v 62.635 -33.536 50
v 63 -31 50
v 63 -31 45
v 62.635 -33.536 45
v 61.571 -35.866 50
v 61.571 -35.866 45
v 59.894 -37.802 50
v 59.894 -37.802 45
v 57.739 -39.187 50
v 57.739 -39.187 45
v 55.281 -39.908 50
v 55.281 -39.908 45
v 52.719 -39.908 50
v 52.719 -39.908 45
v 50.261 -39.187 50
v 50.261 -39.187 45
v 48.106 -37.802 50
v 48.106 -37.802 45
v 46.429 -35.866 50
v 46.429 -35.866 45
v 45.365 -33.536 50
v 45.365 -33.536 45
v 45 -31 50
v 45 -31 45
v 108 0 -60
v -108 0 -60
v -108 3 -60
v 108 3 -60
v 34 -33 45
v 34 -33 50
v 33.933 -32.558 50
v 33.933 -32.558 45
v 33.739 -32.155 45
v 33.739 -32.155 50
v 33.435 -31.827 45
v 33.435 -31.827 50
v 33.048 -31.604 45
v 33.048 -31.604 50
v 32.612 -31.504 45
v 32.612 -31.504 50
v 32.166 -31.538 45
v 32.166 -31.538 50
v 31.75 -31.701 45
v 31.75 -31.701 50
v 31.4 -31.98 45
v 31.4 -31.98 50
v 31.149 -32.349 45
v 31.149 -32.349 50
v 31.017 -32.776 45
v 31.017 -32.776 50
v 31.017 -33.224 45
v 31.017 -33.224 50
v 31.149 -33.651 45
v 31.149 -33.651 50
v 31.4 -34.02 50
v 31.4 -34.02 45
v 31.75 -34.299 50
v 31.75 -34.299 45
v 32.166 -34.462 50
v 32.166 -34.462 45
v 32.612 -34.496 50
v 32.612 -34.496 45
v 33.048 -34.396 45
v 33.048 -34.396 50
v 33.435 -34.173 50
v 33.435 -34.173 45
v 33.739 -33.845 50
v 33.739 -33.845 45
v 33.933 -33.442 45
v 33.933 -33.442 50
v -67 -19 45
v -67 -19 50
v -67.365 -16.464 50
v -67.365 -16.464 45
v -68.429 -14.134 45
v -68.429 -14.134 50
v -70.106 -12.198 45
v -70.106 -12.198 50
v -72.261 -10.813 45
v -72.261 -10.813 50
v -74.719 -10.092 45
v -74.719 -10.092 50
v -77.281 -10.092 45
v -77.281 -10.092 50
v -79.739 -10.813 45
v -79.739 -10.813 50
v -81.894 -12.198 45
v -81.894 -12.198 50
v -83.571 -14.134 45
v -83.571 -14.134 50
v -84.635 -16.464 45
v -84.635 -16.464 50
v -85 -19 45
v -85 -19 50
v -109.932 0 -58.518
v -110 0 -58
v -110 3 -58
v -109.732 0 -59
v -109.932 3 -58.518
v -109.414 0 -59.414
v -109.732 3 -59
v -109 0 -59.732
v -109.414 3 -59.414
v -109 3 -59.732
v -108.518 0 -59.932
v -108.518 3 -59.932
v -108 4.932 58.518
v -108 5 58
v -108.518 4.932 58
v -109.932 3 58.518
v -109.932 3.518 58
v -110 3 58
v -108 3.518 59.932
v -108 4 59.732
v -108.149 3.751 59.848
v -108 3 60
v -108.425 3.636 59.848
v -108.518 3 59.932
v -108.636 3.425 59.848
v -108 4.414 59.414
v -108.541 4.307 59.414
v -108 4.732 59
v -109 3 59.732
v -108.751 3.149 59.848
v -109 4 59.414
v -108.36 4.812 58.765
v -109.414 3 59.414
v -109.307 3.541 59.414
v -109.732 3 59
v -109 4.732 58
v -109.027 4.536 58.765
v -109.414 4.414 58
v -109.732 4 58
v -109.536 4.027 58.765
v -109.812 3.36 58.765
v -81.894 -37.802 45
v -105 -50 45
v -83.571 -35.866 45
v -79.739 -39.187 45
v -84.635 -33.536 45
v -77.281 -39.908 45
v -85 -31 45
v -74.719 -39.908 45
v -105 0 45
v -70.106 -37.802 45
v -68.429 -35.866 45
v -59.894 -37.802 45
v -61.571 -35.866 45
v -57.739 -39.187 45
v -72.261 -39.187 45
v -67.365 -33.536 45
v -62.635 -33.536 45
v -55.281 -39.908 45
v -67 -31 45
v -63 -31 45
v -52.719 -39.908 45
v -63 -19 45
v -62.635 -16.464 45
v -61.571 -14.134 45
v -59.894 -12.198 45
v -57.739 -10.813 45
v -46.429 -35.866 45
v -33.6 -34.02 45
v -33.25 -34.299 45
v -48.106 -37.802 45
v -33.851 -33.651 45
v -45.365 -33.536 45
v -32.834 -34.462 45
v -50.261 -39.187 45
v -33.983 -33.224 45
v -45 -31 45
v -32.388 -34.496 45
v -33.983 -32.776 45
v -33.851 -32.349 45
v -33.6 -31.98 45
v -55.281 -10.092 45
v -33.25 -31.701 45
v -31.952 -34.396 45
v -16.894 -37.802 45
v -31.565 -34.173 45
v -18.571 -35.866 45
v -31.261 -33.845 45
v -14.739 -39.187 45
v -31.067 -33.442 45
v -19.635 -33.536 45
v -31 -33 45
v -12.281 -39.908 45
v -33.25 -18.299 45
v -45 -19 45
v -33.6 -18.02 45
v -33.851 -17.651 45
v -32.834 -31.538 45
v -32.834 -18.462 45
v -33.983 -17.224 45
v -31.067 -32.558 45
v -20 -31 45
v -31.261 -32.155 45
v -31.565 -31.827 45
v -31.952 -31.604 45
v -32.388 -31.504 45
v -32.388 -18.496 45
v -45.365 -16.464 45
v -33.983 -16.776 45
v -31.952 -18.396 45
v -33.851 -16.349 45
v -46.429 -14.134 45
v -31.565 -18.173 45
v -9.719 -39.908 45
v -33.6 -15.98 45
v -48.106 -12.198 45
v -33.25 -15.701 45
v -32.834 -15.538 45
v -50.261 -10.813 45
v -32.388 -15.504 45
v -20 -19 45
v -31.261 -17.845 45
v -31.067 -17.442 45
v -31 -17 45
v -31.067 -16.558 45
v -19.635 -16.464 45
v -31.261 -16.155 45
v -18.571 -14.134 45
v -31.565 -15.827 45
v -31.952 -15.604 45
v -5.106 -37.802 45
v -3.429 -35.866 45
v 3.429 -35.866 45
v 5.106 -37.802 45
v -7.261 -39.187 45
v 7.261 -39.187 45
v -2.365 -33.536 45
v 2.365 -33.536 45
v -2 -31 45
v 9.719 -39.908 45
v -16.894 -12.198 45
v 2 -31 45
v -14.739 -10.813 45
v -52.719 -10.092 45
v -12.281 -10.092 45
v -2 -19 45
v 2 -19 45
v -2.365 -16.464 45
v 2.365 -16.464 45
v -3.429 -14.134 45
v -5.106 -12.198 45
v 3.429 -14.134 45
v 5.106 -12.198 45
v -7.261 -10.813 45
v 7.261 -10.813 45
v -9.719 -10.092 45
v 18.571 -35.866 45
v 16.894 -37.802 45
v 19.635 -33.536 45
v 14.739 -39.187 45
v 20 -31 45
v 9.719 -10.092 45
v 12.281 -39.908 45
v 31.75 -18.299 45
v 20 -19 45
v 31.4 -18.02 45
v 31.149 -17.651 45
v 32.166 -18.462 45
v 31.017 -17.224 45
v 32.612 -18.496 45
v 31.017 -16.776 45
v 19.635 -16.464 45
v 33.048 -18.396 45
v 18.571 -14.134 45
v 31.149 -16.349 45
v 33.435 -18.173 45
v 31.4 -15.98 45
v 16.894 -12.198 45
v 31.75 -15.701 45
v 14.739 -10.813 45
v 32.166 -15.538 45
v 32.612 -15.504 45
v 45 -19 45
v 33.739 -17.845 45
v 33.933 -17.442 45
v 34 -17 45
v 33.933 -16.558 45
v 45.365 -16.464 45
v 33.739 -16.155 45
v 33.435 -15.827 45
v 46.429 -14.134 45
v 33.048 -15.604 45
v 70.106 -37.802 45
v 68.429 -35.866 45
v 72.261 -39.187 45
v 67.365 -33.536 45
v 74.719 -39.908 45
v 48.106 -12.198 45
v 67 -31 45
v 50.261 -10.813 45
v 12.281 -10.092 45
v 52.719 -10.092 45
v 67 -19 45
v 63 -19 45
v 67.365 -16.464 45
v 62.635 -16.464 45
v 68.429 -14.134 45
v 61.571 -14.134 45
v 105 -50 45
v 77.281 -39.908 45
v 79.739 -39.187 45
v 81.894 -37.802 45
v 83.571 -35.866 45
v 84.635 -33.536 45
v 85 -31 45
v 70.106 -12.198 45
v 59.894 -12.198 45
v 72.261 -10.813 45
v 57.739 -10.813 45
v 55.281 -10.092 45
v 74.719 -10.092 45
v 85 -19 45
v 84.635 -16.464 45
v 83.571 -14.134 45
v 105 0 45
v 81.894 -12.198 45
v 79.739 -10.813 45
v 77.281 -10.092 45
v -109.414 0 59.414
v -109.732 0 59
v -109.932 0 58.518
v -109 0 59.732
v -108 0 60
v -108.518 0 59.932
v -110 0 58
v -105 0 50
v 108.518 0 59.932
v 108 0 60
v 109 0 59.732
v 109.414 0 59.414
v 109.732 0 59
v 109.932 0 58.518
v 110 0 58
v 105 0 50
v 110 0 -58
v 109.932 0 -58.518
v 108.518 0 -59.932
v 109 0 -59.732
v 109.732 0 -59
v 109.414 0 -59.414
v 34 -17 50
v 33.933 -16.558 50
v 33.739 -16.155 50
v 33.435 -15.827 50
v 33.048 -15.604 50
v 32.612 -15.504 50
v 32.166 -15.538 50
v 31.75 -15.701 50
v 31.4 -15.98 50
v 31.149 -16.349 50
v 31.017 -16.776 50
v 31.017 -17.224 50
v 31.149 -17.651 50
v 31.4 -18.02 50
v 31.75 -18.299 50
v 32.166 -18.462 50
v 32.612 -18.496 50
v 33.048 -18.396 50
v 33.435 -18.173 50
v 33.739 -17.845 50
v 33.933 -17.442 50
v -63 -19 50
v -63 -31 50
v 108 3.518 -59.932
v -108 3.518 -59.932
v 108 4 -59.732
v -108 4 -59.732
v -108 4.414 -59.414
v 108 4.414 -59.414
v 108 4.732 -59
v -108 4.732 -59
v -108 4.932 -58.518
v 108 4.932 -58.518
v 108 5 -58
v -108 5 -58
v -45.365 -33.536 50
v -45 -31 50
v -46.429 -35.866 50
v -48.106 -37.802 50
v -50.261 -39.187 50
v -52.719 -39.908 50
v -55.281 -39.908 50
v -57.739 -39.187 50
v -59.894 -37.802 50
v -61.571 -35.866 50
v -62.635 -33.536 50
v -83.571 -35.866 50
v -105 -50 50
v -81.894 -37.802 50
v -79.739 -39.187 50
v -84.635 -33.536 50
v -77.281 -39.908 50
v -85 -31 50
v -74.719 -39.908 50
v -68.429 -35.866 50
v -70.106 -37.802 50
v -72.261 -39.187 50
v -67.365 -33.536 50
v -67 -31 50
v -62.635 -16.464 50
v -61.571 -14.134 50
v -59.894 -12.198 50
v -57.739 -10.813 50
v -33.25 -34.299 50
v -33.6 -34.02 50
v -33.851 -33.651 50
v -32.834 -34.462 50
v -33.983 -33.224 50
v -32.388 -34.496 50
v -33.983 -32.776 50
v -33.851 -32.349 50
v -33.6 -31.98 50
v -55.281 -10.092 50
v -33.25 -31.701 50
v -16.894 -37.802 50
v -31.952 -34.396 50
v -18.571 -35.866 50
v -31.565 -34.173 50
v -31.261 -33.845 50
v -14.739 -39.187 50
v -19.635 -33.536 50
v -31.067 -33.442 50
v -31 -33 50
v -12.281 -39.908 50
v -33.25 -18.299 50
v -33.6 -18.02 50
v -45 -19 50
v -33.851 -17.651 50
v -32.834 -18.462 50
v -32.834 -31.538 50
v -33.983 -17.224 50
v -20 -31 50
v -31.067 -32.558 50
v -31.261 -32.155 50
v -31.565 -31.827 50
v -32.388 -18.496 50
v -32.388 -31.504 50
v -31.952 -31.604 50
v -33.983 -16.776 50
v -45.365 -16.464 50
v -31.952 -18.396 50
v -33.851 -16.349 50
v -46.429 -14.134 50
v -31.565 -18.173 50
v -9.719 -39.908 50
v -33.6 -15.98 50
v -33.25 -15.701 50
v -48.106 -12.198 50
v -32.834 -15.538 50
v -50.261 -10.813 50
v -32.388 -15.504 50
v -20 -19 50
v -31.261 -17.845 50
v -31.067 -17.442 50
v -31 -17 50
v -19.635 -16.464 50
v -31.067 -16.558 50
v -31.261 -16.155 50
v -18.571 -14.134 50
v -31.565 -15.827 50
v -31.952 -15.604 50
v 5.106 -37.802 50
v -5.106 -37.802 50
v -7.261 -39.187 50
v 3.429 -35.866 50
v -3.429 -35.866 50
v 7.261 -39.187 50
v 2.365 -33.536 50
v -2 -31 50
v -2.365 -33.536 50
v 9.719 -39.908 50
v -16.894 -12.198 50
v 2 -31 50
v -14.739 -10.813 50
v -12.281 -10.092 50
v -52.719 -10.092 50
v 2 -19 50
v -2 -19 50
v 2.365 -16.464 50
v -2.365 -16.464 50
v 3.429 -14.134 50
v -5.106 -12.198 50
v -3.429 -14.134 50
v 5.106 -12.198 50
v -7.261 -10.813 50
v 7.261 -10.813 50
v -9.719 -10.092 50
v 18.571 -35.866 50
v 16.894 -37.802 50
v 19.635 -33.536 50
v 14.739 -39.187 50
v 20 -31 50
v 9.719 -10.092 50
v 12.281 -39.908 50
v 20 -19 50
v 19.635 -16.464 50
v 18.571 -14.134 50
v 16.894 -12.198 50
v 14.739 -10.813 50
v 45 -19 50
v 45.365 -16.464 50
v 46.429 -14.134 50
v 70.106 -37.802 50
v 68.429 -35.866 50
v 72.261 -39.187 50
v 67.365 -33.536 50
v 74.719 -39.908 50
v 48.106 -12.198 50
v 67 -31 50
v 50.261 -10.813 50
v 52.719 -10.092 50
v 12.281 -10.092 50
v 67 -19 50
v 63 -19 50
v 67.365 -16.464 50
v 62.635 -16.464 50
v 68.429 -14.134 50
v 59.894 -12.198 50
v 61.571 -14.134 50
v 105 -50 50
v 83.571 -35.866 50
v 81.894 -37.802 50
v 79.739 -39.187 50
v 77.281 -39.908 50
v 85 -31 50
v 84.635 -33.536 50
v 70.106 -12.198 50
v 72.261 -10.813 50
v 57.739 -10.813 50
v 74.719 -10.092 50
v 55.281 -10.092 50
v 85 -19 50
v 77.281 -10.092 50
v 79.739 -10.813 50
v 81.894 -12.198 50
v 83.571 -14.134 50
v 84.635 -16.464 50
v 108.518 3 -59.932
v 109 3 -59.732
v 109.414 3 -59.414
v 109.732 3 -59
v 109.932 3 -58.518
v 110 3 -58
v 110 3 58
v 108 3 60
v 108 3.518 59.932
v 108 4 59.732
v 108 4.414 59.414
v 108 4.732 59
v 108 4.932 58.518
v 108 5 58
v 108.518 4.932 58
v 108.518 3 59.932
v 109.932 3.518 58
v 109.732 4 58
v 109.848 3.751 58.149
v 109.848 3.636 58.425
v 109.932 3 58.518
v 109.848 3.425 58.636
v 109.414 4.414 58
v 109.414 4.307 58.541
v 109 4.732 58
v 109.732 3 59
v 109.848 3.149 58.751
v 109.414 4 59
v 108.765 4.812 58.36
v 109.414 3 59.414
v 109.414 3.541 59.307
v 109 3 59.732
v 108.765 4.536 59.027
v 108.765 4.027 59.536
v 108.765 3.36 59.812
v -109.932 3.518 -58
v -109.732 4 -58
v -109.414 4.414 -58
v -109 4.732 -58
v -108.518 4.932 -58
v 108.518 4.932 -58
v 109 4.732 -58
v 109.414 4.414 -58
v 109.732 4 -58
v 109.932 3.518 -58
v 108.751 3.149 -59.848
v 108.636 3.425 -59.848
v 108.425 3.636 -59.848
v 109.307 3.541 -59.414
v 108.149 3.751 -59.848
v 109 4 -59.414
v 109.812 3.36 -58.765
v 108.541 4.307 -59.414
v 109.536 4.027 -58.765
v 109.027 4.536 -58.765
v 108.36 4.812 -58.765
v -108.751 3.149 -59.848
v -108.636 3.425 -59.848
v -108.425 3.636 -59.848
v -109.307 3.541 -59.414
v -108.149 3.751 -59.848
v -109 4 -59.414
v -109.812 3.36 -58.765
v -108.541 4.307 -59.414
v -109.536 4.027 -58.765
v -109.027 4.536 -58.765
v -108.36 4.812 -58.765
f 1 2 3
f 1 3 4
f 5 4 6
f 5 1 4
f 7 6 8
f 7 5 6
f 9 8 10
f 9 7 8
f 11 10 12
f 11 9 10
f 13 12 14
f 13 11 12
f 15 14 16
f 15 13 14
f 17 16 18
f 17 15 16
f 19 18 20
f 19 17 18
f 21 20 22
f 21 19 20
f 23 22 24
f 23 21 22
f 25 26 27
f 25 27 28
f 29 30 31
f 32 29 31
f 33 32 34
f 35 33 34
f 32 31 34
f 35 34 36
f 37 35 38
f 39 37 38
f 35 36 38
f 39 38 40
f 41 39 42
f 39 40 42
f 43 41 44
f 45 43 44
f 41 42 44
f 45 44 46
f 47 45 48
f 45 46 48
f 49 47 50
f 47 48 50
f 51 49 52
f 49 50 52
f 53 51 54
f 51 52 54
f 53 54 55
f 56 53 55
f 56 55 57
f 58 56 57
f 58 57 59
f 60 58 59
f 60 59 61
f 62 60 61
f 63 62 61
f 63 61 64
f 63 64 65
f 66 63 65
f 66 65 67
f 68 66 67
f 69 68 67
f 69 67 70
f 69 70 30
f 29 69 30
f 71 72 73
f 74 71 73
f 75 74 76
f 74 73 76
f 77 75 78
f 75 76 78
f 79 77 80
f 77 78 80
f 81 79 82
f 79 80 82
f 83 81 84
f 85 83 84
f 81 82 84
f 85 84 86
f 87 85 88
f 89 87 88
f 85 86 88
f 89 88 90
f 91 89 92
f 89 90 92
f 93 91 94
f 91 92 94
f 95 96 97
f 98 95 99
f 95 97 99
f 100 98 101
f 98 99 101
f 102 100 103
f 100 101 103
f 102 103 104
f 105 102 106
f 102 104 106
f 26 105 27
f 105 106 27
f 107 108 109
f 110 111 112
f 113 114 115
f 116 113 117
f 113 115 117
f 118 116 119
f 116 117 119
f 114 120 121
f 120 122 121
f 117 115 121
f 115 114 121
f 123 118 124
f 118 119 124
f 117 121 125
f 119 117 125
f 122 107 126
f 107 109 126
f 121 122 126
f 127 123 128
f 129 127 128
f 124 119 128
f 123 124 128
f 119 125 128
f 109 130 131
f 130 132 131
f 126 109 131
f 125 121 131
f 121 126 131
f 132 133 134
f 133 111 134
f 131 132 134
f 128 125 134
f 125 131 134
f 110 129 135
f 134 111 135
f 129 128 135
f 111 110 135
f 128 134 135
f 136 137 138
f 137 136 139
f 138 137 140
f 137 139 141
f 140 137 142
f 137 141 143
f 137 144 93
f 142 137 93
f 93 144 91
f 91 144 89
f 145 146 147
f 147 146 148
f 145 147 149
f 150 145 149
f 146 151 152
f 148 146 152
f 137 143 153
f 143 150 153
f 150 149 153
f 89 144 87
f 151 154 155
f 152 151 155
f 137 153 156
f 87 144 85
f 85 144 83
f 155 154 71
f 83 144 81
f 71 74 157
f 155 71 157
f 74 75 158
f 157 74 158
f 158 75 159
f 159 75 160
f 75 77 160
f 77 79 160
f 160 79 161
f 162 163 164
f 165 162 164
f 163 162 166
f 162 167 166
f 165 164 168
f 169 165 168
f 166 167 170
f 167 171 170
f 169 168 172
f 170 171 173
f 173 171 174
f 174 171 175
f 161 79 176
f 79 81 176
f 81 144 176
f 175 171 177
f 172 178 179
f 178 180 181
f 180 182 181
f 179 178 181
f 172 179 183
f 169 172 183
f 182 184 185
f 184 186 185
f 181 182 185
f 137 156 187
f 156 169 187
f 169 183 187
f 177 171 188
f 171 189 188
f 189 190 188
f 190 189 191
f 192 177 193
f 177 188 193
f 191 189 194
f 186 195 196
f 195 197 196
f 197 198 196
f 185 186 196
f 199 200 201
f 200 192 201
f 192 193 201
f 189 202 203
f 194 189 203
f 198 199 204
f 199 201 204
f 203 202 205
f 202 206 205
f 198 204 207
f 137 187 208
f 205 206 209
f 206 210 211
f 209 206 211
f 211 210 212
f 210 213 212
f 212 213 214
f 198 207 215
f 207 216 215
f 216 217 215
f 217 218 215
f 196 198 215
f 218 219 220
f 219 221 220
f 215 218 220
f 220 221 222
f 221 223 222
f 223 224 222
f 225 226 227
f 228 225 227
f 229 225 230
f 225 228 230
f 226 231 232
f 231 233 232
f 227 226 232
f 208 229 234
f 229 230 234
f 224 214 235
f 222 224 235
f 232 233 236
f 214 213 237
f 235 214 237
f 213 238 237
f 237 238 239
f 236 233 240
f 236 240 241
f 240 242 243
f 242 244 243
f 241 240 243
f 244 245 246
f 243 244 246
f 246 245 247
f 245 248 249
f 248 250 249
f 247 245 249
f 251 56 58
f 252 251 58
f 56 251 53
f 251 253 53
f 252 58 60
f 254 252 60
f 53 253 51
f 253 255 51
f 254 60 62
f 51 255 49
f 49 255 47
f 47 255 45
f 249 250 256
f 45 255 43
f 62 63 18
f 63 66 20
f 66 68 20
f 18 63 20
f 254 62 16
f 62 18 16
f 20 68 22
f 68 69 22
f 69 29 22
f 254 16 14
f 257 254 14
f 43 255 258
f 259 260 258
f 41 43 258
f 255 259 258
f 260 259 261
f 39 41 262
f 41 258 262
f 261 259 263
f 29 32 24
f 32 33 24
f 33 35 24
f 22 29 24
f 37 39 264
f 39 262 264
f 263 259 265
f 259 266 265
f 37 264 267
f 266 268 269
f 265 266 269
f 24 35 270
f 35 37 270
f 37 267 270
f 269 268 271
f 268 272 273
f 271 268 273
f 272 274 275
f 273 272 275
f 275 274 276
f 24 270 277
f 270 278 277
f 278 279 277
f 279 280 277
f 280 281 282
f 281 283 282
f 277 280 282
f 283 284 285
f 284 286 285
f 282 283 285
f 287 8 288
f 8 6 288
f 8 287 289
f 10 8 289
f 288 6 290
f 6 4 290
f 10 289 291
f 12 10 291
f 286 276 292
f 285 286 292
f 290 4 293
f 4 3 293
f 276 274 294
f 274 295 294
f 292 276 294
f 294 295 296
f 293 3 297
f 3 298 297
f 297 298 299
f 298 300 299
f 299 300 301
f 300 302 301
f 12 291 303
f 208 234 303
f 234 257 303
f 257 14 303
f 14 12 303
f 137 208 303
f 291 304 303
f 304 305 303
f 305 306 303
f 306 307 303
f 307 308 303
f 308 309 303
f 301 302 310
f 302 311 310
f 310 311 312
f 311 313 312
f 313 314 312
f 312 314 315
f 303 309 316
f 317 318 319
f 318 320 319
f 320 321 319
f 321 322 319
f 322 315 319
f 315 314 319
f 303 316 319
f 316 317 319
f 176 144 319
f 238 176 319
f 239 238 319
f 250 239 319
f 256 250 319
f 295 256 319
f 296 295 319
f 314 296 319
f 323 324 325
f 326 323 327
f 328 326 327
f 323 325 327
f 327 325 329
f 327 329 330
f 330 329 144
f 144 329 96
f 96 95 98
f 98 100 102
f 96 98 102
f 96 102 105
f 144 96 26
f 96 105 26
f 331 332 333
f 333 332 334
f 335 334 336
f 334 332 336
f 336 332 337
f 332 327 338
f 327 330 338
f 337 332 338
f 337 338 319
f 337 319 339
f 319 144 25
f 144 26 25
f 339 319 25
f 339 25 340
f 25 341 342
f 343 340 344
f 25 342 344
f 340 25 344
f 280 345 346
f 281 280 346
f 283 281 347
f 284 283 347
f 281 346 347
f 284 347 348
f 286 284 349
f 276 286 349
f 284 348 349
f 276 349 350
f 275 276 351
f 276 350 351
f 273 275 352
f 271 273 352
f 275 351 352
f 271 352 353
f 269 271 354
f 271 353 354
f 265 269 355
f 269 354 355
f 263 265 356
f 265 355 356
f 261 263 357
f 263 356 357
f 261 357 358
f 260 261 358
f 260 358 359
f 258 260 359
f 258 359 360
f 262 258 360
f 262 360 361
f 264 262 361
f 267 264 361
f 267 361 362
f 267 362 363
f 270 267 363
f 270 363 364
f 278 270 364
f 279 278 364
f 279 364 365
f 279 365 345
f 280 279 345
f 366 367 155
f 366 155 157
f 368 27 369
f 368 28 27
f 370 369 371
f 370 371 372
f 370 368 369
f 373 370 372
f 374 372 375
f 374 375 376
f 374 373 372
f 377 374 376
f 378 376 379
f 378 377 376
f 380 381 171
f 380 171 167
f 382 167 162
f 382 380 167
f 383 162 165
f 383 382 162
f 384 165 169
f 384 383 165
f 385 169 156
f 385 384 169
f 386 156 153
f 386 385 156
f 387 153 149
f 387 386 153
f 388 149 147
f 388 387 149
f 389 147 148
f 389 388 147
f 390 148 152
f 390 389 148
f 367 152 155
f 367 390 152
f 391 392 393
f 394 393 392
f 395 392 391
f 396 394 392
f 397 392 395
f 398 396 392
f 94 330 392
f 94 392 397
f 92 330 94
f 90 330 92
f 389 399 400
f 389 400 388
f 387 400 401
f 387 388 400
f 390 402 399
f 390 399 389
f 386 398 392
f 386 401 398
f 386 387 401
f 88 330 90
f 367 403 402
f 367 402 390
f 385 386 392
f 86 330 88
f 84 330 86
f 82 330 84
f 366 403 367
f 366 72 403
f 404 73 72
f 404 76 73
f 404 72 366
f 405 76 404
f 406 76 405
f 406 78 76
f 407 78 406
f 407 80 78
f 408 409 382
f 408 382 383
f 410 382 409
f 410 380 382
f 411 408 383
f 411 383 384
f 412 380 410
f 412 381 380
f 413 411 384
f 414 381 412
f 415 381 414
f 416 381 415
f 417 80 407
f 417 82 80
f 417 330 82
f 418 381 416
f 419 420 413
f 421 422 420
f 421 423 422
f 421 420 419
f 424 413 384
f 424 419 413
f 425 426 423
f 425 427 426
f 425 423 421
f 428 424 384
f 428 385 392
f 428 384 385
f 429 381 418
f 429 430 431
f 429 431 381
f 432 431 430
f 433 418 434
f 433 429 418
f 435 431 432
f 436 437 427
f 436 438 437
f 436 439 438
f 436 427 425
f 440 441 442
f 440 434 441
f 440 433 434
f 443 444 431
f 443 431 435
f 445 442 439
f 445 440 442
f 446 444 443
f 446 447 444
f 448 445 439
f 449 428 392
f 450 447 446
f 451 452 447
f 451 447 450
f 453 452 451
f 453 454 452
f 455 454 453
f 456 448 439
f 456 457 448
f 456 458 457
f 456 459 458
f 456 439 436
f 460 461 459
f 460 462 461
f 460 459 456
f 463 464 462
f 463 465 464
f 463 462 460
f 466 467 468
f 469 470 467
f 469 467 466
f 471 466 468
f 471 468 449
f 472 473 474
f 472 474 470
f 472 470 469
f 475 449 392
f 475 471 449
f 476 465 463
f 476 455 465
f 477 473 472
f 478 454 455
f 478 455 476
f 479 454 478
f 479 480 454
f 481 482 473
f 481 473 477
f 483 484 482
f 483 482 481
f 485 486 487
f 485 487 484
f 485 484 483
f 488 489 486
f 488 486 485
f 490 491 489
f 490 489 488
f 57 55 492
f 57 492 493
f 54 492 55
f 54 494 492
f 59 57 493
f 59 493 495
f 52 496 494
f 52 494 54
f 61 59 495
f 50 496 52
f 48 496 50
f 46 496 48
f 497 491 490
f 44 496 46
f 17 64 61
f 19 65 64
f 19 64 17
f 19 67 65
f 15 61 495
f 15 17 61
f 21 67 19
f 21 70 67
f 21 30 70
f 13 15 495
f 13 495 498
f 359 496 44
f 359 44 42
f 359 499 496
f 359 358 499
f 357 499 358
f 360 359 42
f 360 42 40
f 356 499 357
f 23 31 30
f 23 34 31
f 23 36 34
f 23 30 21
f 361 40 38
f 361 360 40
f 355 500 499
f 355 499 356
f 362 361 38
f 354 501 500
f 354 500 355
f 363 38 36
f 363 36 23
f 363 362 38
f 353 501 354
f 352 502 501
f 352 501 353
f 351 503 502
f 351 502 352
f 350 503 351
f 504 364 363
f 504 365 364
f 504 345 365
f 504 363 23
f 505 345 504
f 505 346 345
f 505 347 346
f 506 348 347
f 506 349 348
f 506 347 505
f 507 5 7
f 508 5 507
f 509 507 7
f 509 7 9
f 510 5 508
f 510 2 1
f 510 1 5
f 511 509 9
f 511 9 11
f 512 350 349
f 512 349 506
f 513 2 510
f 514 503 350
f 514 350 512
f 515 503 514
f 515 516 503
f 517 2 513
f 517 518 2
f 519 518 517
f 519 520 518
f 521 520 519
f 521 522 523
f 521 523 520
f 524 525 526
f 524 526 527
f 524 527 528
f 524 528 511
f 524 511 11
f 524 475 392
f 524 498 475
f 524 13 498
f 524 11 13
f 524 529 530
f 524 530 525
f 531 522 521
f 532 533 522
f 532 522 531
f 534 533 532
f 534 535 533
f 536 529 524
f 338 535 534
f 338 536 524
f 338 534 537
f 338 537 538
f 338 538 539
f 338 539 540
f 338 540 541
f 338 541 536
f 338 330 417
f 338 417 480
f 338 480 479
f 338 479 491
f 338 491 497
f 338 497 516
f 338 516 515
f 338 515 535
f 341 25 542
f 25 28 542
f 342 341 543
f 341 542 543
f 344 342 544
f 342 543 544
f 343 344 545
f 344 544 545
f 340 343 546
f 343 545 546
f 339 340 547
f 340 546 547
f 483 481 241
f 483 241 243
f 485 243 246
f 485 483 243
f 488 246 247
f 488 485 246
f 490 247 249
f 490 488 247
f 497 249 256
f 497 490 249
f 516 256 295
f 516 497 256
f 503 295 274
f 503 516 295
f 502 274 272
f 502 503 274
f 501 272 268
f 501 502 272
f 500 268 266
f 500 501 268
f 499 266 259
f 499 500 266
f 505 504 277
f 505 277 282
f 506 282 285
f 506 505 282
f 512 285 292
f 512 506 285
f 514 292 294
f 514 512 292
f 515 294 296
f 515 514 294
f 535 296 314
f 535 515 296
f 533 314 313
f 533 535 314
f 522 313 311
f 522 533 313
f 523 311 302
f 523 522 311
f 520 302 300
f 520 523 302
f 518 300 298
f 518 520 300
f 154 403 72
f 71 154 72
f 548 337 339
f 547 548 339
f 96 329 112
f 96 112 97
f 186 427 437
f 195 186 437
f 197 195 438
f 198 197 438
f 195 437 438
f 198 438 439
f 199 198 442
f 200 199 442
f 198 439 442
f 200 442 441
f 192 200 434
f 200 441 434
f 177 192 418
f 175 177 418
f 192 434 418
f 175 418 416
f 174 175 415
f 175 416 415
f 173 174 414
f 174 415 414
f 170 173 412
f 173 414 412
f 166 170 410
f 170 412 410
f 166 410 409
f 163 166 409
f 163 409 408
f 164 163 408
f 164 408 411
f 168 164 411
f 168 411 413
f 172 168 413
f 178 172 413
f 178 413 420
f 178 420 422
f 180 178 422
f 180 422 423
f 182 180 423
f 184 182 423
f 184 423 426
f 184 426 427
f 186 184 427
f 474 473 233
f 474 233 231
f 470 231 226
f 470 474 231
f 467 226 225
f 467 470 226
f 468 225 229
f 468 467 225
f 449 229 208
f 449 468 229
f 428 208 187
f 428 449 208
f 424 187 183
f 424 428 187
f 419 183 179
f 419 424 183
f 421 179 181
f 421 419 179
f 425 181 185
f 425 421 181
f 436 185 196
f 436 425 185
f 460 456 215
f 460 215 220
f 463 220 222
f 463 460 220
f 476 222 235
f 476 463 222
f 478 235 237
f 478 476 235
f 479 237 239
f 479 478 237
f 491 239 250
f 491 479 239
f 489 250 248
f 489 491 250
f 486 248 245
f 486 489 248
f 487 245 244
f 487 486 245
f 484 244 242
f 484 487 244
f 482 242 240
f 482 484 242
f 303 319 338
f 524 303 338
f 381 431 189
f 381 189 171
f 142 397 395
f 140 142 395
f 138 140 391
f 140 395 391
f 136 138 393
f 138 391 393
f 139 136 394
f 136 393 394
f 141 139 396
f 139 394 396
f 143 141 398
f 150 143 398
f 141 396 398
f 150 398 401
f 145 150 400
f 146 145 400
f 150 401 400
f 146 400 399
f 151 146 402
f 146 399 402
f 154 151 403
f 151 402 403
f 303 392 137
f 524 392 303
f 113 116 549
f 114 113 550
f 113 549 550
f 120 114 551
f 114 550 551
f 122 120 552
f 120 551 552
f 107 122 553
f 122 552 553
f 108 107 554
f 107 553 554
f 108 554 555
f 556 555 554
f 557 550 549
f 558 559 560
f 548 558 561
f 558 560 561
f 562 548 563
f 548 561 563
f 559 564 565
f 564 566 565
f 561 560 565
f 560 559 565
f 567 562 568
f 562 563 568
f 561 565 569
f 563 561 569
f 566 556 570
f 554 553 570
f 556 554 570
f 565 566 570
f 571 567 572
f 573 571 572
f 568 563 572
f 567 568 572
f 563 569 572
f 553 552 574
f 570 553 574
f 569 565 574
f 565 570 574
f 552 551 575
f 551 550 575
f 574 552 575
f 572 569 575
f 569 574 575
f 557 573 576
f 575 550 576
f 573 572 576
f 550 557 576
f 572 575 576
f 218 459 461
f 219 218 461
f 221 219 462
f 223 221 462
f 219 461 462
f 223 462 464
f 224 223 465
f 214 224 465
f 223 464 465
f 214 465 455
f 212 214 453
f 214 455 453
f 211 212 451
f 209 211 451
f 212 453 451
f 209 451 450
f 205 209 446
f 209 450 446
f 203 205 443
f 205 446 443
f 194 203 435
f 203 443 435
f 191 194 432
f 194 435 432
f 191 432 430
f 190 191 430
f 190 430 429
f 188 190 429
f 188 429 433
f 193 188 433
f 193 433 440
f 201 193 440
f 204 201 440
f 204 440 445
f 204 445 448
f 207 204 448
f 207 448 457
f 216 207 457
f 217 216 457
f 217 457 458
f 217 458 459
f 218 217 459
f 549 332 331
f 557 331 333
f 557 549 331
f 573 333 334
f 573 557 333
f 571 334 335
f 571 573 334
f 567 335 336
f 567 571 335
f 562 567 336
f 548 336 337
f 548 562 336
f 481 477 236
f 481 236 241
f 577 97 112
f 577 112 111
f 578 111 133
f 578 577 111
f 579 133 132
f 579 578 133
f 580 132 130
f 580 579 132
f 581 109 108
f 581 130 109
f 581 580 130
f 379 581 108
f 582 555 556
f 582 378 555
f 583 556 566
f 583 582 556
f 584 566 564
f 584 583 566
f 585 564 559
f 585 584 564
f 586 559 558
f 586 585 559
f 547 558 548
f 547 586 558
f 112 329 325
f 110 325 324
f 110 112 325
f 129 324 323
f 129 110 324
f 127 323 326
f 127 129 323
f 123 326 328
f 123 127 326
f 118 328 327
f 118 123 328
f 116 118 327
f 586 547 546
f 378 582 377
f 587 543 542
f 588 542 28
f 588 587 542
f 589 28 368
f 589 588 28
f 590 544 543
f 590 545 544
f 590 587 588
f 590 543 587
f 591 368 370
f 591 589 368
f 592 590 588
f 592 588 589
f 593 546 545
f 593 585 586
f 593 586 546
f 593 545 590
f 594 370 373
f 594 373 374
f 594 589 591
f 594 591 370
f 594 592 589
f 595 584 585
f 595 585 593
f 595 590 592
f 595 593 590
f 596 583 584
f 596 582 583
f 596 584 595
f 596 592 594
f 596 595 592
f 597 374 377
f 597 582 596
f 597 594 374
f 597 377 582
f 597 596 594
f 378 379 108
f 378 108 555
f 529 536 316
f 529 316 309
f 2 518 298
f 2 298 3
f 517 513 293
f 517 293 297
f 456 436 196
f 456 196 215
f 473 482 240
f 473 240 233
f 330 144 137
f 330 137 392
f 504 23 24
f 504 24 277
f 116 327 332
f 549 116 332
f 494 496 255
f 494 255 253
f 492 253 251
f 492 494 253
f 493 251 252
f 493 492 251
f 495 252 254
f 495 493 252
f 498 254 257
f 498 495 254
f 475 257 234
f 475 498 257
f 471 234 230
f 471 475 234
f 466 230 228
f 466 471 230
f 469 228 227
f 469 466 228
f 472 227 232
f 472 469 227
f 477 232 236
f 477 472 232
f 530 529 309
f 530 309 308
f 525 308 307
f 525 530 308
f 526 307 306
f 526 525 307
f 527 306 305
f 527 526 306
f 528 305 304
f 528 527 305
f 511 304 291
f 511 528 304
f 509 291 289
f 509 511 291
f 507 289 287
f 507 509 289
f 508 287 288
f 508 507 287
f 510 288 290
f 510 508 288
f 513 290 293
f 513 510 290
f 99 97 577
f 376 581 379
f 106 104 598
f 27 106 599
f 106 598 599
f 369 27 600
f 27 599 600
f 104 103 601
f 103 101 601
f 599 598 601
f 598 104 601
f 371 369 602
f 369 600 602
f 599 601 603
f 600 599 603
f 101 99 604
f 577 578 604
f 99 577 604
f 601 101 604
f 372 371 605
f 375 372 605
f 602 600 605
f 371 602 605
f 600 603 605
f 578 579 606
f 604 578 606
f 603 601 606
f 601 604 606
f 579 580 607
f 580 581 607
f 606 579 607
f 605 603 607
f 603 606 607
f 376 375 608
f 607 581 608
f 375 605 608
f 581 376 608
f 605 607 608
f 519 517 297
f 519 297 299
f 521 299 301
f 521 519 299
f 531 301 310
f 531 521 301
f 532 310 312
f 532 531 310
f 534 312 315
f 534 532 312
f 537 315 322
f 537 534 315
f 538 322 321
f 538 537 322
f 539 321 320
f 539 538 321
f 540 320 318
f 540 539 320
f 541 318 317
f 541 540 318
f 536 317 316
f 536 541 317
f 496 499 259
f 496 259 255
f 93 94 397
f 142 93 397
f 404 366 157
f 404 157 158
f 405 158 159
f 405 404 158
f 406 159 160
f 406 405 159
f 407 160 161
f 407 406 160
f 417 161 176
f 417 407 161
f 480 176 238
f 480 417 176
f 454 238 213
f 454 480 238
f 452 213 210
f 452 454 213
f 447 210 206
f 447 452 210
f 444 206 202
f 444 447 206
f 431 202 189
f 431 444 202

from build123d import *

# Parameters (mm, degrees)
CROQUIS1_W              = 220
CROQUIS1_H              = 120
SALIENTE_EXTRUIR1_DEPTH = 5
CROQUIS2_W              = 210
CROQUIS2_H              = 5
SALIENTE_EXTRUIR2_DEPTH = 50
CORTAR_EXTRUIR1_REACH   = 165.401
REDONDEO1_R             = 2
CORTAR_EXTRUIR3_REACH   = 165.401
CROQUIS11_R             = 1.5


with BuildPart() as part:
    # Croquis1 → Saliente-Extruir1 (new body)
    with BuildSketch(Plane(origin=(0, 0, 0), x_dir=(1, 0, 0), z_dir=(0, 1, 0))):
        Rectangle(CROQUIS1_W, CROQUIS1_H)
    extrude(amount=SALIENTE_EXTRUIR1_DEPTH)

    # Croquis2 → Saliente-Extruir2 (add)
    with BuildSketch(Plane.XZ):
        with Locations((0, 47.5)):
            Rectangle(CROQUIS2_W, CROQUIS2_H)
    extrude(amount=SALIENTE_EXTRUIR2_DEPTH)

    # Croquis3 → Cortar-Extruir1 (cut, up to next)
    with BuildSketch(Plane.XY.offset(50), mode=Mode.PRIVATE) as cortar_extruir1_sk1:
        with BuildLine():
            Line((-45, -19), (-45, -31))
            ThreePointArc((-45, -31), (-54, -40), (-63, -31))
            Line((-63, -31), (-63, -19))
            ThreePointArc((-63, -19), (-54, -10), (-45, -19))
        make_face()
    cortar_extruir1_tool1 = extrude(cortar_extruir1_sk1.sketch, amount=-CORTAR_EXTRUIR1_REACH, mode=Mode.PRIVATE) & part.part
    # Croquis3 → Cortar-Extruir1 (cut, up to next)
    with BuildSketch(Plane.XY.offset(50), mode=Mode.PRIVATE) as cortar_extruir1_sk2:
        with BuildLine():
            Line((-85, -19), (-85, -31))
            ThreePointArc((-85, -31), (-76, -40), (-67, -31))
            Line((-67, -31), (-67, -19))
            ThreePointArc((-67, -19), (-76, -10), (-85, -19))
        make_face()
    cortar_extruir1_tool2 = extrude(cortar_extruir1_sk2.sketch, amount=-CORTAR_EXTRUIR1_REACH, mode=Mode.PRIVATE) & part.part
    # Croquis3 → Cortar-Extruir1 (cut, up to next)
    with BuildSketch(Plane.XY.offset(50), mode=Mode.PRIVATE) as cortar_extruir1_sk3:
        with BuildLine():
            Line((20, -19), (20, -31))
            ThreePointArc((20, -31), (11, -40), (2, -31))
            Line((2, -31), (2, -19))
            ThreePointArc((2, -19), (11, -10), (20, -19))
        make_face()
    cortar_extruir1_tool3 = extrude(cortar_extruir1_sk3.sketch, amount=-CORTAR_EXTRUIR1_REACH, mode=Mode.PRIVATE) & part.part
    # Croquis3 → Cortar-Extruir1 (cut, up to next)
    with BuildSketch(Plane.XY.offset(50), mode=Mode.PRIVATE) as cortar_extruir1_sk4:
        with BuildLine():
            Line((-2, -19), (-2, -31))
            ThreePointArc((-2, -31), (-11, -40), (-20, -31))
            Line((-20, -31), (-20, -19))
            ThreePointArc((-20, -19), (-11, -10), (-2, -19))
        make_face()
    cortar_extruir1_tool4 = extrude(cortar_extruir1_sk4.sketch, amount=-CORTAR_EXTRUIR1_REACH, mode=Mode.PRIVATE) & part.part
    # Croquis3 → Cortar-Extruir1 (cut, up to next)
    with BuildSketch(Plane.XY.offset(50), mode=Mode.PRIVATE) as cortar_extruir1_sk5:
        with BuildLine():
            Line((85, -19), (85, -31))
            ThreePointArc((85, -31), (76, -40), (67, -31))
            Line((67, -31), (67, -19))
            ThreePointArc((67, -19), (76, -10), (85, -19))
        make_face()
    cortar_extruir1_tool5 = extrude(cortar_extruir1_sk5.sketch, amount=-CORTAR_EXTRUIR1_REACH, mode=Mode.PRIVATE) & part.part
    # Croquis3 → Cortar-Extruir1 (cut, up to next)
    with BuildSketch(Plane.XY.offset(50), mode=Mode.PRIVATE) as cortar_extruir1_sk6:
        with BuildLine():
            Line((63, -19), (63, -31))
            ThreePointArc((63, -31), (54, -40), (45, -31))
            Line((45, -31), (45, -19))
            ThreePointArc((45, -19), (54, -10), (63, -19))
        make_face()
    cortar_extruir1_tool6 = extrude(cortar_extruir1_sk6.sketch, amount=-CORTAR_EXTRUIR1_REACH, mode=Mode.PRIVATE) & part.part
    add(cortar_extruir1_tool1.solids().sort_by_distance((-54, -25, 50))[0], mode=Mode.SUBTRACT)
    add(cortar_extruir1_tool2.solids().sort_by_distance((-76, -25, 50))[0], mode=Mode.SUBTRACT)
    add(cortar_extruir1_tool3.solids().sort_by_distance((11, -25, 50))[0], mode=Mode.SUBTRACT)
    add(cortar_extruir1_tool4.solids().sort_by_distance((-11, -25, 50))[0], mode=Mode.SUBTRACT)
    add(cortar_extruir1_tool5.solids().sort_by_distance((76, -25, 50))[0], mode=Mode.SUBTRACT)
    add(cortar_extruir1_tool6.solids().sort_by_distance((54, -25, 50))[0], mode=Mode.SUBTRACT)

    # Redondeo1
    redondeo1_edges = [part.edges().sort_by_distance(p)[0] for p in [
        (-110, 5, 0),
        (0, 5, 60),
        (110, 5, 0),
        (110, 2.5, 60),
        (-110, 2.5, 60),
        (-110, 2.5, -60),
        (110, 2.5, -60),
        (0, 5, -60),
    ]]
    fillet(redondeo1_edges, radius=REDONDEO1_R)

    # Croquis11 → Cortar-Extruir3 (cut, up to next)
    with BuildSketch(Plane.XY.offset(50), mode=Mode.PRIVATE) as cortar_extruir3_sk1:
        with Locations((-32.5, -17)):
            Circle(CROQUIS11_R)
    cortar_extruir3_tool1 = extrude(cortar_extruir3_sk1.sketch, amount=-CORTAR_EXTRUIR3_REACH, mode=Mode.PRIVATE) & part.part
    # Croquis11 → Cortar-Extruir3 (cut, up to next)
    with BuildSketch(Plane.XY.offset(50), mode=Mode.PRIVATE) as cortar_extruir3_sk2:
        with Locations((-32.5, -33)):
            Circle(CROQUIS11_R)
    cortar_extruir3_tool2 = extrude(cortar_extruir3_sk2.sketch, amount=-CORTAR_EXTRUIR3_REACH, mode=Mode.PRIVATE) & part.part
    # Croquis11 → Cortar-Extruir3 (cut, up to next)
    with BuildSketch(Plane.XY.offset(50), mode=Mode.PRIVATE) as cortar_extruir3_sk3:
        with Locations((32.5, -17)):
            Circle(CROQUIS11_R)
    cortar_extruir3_tool3 = extrude(cortar_extruir3_sk3.sketch, amount=-CORTAR_EXTRUIR3_REACH, mode=Mode.PRIVATE) & part.part
    # Croquis11 → Cortar-Extruir3 (cut, up to next)
    with BuildSketch(Plane.XY.offset(50), mode=Mode.PRIVATE) as cortar_extruir3_sk4:
        with Locations((32.5, -33)):
            Circle(CROQUIS11_R)
    cortar_extruir3_tool4 = extrude(cortar_extruir3_sk4.sketch, amount=-CORTAR_EXTRUIR3_REACH, mode=Mode.PRIVATE) & part.part
    add(cortar_extruir3_tool1.solids().sort_by_distance((-32.5, -17, 50))[0], mode=Mode.SUBTRACT)
    add(cortar_extruir3_tool2.solids().sort_by_distance((-32.5, -33, 50))[0], mode=Mode.SUBTRACT)
    add(cortar_extruir3_tool3.solids().sort_by_distance((32.5, -17, 50))[0], mode=Mode.SUBTRACT)
    add(cortar_extruir3_tool4.solids().sort_by_distance((32.5, -33, 50))[0], mode=Mode.SUBTRACT)


solid = part.part
